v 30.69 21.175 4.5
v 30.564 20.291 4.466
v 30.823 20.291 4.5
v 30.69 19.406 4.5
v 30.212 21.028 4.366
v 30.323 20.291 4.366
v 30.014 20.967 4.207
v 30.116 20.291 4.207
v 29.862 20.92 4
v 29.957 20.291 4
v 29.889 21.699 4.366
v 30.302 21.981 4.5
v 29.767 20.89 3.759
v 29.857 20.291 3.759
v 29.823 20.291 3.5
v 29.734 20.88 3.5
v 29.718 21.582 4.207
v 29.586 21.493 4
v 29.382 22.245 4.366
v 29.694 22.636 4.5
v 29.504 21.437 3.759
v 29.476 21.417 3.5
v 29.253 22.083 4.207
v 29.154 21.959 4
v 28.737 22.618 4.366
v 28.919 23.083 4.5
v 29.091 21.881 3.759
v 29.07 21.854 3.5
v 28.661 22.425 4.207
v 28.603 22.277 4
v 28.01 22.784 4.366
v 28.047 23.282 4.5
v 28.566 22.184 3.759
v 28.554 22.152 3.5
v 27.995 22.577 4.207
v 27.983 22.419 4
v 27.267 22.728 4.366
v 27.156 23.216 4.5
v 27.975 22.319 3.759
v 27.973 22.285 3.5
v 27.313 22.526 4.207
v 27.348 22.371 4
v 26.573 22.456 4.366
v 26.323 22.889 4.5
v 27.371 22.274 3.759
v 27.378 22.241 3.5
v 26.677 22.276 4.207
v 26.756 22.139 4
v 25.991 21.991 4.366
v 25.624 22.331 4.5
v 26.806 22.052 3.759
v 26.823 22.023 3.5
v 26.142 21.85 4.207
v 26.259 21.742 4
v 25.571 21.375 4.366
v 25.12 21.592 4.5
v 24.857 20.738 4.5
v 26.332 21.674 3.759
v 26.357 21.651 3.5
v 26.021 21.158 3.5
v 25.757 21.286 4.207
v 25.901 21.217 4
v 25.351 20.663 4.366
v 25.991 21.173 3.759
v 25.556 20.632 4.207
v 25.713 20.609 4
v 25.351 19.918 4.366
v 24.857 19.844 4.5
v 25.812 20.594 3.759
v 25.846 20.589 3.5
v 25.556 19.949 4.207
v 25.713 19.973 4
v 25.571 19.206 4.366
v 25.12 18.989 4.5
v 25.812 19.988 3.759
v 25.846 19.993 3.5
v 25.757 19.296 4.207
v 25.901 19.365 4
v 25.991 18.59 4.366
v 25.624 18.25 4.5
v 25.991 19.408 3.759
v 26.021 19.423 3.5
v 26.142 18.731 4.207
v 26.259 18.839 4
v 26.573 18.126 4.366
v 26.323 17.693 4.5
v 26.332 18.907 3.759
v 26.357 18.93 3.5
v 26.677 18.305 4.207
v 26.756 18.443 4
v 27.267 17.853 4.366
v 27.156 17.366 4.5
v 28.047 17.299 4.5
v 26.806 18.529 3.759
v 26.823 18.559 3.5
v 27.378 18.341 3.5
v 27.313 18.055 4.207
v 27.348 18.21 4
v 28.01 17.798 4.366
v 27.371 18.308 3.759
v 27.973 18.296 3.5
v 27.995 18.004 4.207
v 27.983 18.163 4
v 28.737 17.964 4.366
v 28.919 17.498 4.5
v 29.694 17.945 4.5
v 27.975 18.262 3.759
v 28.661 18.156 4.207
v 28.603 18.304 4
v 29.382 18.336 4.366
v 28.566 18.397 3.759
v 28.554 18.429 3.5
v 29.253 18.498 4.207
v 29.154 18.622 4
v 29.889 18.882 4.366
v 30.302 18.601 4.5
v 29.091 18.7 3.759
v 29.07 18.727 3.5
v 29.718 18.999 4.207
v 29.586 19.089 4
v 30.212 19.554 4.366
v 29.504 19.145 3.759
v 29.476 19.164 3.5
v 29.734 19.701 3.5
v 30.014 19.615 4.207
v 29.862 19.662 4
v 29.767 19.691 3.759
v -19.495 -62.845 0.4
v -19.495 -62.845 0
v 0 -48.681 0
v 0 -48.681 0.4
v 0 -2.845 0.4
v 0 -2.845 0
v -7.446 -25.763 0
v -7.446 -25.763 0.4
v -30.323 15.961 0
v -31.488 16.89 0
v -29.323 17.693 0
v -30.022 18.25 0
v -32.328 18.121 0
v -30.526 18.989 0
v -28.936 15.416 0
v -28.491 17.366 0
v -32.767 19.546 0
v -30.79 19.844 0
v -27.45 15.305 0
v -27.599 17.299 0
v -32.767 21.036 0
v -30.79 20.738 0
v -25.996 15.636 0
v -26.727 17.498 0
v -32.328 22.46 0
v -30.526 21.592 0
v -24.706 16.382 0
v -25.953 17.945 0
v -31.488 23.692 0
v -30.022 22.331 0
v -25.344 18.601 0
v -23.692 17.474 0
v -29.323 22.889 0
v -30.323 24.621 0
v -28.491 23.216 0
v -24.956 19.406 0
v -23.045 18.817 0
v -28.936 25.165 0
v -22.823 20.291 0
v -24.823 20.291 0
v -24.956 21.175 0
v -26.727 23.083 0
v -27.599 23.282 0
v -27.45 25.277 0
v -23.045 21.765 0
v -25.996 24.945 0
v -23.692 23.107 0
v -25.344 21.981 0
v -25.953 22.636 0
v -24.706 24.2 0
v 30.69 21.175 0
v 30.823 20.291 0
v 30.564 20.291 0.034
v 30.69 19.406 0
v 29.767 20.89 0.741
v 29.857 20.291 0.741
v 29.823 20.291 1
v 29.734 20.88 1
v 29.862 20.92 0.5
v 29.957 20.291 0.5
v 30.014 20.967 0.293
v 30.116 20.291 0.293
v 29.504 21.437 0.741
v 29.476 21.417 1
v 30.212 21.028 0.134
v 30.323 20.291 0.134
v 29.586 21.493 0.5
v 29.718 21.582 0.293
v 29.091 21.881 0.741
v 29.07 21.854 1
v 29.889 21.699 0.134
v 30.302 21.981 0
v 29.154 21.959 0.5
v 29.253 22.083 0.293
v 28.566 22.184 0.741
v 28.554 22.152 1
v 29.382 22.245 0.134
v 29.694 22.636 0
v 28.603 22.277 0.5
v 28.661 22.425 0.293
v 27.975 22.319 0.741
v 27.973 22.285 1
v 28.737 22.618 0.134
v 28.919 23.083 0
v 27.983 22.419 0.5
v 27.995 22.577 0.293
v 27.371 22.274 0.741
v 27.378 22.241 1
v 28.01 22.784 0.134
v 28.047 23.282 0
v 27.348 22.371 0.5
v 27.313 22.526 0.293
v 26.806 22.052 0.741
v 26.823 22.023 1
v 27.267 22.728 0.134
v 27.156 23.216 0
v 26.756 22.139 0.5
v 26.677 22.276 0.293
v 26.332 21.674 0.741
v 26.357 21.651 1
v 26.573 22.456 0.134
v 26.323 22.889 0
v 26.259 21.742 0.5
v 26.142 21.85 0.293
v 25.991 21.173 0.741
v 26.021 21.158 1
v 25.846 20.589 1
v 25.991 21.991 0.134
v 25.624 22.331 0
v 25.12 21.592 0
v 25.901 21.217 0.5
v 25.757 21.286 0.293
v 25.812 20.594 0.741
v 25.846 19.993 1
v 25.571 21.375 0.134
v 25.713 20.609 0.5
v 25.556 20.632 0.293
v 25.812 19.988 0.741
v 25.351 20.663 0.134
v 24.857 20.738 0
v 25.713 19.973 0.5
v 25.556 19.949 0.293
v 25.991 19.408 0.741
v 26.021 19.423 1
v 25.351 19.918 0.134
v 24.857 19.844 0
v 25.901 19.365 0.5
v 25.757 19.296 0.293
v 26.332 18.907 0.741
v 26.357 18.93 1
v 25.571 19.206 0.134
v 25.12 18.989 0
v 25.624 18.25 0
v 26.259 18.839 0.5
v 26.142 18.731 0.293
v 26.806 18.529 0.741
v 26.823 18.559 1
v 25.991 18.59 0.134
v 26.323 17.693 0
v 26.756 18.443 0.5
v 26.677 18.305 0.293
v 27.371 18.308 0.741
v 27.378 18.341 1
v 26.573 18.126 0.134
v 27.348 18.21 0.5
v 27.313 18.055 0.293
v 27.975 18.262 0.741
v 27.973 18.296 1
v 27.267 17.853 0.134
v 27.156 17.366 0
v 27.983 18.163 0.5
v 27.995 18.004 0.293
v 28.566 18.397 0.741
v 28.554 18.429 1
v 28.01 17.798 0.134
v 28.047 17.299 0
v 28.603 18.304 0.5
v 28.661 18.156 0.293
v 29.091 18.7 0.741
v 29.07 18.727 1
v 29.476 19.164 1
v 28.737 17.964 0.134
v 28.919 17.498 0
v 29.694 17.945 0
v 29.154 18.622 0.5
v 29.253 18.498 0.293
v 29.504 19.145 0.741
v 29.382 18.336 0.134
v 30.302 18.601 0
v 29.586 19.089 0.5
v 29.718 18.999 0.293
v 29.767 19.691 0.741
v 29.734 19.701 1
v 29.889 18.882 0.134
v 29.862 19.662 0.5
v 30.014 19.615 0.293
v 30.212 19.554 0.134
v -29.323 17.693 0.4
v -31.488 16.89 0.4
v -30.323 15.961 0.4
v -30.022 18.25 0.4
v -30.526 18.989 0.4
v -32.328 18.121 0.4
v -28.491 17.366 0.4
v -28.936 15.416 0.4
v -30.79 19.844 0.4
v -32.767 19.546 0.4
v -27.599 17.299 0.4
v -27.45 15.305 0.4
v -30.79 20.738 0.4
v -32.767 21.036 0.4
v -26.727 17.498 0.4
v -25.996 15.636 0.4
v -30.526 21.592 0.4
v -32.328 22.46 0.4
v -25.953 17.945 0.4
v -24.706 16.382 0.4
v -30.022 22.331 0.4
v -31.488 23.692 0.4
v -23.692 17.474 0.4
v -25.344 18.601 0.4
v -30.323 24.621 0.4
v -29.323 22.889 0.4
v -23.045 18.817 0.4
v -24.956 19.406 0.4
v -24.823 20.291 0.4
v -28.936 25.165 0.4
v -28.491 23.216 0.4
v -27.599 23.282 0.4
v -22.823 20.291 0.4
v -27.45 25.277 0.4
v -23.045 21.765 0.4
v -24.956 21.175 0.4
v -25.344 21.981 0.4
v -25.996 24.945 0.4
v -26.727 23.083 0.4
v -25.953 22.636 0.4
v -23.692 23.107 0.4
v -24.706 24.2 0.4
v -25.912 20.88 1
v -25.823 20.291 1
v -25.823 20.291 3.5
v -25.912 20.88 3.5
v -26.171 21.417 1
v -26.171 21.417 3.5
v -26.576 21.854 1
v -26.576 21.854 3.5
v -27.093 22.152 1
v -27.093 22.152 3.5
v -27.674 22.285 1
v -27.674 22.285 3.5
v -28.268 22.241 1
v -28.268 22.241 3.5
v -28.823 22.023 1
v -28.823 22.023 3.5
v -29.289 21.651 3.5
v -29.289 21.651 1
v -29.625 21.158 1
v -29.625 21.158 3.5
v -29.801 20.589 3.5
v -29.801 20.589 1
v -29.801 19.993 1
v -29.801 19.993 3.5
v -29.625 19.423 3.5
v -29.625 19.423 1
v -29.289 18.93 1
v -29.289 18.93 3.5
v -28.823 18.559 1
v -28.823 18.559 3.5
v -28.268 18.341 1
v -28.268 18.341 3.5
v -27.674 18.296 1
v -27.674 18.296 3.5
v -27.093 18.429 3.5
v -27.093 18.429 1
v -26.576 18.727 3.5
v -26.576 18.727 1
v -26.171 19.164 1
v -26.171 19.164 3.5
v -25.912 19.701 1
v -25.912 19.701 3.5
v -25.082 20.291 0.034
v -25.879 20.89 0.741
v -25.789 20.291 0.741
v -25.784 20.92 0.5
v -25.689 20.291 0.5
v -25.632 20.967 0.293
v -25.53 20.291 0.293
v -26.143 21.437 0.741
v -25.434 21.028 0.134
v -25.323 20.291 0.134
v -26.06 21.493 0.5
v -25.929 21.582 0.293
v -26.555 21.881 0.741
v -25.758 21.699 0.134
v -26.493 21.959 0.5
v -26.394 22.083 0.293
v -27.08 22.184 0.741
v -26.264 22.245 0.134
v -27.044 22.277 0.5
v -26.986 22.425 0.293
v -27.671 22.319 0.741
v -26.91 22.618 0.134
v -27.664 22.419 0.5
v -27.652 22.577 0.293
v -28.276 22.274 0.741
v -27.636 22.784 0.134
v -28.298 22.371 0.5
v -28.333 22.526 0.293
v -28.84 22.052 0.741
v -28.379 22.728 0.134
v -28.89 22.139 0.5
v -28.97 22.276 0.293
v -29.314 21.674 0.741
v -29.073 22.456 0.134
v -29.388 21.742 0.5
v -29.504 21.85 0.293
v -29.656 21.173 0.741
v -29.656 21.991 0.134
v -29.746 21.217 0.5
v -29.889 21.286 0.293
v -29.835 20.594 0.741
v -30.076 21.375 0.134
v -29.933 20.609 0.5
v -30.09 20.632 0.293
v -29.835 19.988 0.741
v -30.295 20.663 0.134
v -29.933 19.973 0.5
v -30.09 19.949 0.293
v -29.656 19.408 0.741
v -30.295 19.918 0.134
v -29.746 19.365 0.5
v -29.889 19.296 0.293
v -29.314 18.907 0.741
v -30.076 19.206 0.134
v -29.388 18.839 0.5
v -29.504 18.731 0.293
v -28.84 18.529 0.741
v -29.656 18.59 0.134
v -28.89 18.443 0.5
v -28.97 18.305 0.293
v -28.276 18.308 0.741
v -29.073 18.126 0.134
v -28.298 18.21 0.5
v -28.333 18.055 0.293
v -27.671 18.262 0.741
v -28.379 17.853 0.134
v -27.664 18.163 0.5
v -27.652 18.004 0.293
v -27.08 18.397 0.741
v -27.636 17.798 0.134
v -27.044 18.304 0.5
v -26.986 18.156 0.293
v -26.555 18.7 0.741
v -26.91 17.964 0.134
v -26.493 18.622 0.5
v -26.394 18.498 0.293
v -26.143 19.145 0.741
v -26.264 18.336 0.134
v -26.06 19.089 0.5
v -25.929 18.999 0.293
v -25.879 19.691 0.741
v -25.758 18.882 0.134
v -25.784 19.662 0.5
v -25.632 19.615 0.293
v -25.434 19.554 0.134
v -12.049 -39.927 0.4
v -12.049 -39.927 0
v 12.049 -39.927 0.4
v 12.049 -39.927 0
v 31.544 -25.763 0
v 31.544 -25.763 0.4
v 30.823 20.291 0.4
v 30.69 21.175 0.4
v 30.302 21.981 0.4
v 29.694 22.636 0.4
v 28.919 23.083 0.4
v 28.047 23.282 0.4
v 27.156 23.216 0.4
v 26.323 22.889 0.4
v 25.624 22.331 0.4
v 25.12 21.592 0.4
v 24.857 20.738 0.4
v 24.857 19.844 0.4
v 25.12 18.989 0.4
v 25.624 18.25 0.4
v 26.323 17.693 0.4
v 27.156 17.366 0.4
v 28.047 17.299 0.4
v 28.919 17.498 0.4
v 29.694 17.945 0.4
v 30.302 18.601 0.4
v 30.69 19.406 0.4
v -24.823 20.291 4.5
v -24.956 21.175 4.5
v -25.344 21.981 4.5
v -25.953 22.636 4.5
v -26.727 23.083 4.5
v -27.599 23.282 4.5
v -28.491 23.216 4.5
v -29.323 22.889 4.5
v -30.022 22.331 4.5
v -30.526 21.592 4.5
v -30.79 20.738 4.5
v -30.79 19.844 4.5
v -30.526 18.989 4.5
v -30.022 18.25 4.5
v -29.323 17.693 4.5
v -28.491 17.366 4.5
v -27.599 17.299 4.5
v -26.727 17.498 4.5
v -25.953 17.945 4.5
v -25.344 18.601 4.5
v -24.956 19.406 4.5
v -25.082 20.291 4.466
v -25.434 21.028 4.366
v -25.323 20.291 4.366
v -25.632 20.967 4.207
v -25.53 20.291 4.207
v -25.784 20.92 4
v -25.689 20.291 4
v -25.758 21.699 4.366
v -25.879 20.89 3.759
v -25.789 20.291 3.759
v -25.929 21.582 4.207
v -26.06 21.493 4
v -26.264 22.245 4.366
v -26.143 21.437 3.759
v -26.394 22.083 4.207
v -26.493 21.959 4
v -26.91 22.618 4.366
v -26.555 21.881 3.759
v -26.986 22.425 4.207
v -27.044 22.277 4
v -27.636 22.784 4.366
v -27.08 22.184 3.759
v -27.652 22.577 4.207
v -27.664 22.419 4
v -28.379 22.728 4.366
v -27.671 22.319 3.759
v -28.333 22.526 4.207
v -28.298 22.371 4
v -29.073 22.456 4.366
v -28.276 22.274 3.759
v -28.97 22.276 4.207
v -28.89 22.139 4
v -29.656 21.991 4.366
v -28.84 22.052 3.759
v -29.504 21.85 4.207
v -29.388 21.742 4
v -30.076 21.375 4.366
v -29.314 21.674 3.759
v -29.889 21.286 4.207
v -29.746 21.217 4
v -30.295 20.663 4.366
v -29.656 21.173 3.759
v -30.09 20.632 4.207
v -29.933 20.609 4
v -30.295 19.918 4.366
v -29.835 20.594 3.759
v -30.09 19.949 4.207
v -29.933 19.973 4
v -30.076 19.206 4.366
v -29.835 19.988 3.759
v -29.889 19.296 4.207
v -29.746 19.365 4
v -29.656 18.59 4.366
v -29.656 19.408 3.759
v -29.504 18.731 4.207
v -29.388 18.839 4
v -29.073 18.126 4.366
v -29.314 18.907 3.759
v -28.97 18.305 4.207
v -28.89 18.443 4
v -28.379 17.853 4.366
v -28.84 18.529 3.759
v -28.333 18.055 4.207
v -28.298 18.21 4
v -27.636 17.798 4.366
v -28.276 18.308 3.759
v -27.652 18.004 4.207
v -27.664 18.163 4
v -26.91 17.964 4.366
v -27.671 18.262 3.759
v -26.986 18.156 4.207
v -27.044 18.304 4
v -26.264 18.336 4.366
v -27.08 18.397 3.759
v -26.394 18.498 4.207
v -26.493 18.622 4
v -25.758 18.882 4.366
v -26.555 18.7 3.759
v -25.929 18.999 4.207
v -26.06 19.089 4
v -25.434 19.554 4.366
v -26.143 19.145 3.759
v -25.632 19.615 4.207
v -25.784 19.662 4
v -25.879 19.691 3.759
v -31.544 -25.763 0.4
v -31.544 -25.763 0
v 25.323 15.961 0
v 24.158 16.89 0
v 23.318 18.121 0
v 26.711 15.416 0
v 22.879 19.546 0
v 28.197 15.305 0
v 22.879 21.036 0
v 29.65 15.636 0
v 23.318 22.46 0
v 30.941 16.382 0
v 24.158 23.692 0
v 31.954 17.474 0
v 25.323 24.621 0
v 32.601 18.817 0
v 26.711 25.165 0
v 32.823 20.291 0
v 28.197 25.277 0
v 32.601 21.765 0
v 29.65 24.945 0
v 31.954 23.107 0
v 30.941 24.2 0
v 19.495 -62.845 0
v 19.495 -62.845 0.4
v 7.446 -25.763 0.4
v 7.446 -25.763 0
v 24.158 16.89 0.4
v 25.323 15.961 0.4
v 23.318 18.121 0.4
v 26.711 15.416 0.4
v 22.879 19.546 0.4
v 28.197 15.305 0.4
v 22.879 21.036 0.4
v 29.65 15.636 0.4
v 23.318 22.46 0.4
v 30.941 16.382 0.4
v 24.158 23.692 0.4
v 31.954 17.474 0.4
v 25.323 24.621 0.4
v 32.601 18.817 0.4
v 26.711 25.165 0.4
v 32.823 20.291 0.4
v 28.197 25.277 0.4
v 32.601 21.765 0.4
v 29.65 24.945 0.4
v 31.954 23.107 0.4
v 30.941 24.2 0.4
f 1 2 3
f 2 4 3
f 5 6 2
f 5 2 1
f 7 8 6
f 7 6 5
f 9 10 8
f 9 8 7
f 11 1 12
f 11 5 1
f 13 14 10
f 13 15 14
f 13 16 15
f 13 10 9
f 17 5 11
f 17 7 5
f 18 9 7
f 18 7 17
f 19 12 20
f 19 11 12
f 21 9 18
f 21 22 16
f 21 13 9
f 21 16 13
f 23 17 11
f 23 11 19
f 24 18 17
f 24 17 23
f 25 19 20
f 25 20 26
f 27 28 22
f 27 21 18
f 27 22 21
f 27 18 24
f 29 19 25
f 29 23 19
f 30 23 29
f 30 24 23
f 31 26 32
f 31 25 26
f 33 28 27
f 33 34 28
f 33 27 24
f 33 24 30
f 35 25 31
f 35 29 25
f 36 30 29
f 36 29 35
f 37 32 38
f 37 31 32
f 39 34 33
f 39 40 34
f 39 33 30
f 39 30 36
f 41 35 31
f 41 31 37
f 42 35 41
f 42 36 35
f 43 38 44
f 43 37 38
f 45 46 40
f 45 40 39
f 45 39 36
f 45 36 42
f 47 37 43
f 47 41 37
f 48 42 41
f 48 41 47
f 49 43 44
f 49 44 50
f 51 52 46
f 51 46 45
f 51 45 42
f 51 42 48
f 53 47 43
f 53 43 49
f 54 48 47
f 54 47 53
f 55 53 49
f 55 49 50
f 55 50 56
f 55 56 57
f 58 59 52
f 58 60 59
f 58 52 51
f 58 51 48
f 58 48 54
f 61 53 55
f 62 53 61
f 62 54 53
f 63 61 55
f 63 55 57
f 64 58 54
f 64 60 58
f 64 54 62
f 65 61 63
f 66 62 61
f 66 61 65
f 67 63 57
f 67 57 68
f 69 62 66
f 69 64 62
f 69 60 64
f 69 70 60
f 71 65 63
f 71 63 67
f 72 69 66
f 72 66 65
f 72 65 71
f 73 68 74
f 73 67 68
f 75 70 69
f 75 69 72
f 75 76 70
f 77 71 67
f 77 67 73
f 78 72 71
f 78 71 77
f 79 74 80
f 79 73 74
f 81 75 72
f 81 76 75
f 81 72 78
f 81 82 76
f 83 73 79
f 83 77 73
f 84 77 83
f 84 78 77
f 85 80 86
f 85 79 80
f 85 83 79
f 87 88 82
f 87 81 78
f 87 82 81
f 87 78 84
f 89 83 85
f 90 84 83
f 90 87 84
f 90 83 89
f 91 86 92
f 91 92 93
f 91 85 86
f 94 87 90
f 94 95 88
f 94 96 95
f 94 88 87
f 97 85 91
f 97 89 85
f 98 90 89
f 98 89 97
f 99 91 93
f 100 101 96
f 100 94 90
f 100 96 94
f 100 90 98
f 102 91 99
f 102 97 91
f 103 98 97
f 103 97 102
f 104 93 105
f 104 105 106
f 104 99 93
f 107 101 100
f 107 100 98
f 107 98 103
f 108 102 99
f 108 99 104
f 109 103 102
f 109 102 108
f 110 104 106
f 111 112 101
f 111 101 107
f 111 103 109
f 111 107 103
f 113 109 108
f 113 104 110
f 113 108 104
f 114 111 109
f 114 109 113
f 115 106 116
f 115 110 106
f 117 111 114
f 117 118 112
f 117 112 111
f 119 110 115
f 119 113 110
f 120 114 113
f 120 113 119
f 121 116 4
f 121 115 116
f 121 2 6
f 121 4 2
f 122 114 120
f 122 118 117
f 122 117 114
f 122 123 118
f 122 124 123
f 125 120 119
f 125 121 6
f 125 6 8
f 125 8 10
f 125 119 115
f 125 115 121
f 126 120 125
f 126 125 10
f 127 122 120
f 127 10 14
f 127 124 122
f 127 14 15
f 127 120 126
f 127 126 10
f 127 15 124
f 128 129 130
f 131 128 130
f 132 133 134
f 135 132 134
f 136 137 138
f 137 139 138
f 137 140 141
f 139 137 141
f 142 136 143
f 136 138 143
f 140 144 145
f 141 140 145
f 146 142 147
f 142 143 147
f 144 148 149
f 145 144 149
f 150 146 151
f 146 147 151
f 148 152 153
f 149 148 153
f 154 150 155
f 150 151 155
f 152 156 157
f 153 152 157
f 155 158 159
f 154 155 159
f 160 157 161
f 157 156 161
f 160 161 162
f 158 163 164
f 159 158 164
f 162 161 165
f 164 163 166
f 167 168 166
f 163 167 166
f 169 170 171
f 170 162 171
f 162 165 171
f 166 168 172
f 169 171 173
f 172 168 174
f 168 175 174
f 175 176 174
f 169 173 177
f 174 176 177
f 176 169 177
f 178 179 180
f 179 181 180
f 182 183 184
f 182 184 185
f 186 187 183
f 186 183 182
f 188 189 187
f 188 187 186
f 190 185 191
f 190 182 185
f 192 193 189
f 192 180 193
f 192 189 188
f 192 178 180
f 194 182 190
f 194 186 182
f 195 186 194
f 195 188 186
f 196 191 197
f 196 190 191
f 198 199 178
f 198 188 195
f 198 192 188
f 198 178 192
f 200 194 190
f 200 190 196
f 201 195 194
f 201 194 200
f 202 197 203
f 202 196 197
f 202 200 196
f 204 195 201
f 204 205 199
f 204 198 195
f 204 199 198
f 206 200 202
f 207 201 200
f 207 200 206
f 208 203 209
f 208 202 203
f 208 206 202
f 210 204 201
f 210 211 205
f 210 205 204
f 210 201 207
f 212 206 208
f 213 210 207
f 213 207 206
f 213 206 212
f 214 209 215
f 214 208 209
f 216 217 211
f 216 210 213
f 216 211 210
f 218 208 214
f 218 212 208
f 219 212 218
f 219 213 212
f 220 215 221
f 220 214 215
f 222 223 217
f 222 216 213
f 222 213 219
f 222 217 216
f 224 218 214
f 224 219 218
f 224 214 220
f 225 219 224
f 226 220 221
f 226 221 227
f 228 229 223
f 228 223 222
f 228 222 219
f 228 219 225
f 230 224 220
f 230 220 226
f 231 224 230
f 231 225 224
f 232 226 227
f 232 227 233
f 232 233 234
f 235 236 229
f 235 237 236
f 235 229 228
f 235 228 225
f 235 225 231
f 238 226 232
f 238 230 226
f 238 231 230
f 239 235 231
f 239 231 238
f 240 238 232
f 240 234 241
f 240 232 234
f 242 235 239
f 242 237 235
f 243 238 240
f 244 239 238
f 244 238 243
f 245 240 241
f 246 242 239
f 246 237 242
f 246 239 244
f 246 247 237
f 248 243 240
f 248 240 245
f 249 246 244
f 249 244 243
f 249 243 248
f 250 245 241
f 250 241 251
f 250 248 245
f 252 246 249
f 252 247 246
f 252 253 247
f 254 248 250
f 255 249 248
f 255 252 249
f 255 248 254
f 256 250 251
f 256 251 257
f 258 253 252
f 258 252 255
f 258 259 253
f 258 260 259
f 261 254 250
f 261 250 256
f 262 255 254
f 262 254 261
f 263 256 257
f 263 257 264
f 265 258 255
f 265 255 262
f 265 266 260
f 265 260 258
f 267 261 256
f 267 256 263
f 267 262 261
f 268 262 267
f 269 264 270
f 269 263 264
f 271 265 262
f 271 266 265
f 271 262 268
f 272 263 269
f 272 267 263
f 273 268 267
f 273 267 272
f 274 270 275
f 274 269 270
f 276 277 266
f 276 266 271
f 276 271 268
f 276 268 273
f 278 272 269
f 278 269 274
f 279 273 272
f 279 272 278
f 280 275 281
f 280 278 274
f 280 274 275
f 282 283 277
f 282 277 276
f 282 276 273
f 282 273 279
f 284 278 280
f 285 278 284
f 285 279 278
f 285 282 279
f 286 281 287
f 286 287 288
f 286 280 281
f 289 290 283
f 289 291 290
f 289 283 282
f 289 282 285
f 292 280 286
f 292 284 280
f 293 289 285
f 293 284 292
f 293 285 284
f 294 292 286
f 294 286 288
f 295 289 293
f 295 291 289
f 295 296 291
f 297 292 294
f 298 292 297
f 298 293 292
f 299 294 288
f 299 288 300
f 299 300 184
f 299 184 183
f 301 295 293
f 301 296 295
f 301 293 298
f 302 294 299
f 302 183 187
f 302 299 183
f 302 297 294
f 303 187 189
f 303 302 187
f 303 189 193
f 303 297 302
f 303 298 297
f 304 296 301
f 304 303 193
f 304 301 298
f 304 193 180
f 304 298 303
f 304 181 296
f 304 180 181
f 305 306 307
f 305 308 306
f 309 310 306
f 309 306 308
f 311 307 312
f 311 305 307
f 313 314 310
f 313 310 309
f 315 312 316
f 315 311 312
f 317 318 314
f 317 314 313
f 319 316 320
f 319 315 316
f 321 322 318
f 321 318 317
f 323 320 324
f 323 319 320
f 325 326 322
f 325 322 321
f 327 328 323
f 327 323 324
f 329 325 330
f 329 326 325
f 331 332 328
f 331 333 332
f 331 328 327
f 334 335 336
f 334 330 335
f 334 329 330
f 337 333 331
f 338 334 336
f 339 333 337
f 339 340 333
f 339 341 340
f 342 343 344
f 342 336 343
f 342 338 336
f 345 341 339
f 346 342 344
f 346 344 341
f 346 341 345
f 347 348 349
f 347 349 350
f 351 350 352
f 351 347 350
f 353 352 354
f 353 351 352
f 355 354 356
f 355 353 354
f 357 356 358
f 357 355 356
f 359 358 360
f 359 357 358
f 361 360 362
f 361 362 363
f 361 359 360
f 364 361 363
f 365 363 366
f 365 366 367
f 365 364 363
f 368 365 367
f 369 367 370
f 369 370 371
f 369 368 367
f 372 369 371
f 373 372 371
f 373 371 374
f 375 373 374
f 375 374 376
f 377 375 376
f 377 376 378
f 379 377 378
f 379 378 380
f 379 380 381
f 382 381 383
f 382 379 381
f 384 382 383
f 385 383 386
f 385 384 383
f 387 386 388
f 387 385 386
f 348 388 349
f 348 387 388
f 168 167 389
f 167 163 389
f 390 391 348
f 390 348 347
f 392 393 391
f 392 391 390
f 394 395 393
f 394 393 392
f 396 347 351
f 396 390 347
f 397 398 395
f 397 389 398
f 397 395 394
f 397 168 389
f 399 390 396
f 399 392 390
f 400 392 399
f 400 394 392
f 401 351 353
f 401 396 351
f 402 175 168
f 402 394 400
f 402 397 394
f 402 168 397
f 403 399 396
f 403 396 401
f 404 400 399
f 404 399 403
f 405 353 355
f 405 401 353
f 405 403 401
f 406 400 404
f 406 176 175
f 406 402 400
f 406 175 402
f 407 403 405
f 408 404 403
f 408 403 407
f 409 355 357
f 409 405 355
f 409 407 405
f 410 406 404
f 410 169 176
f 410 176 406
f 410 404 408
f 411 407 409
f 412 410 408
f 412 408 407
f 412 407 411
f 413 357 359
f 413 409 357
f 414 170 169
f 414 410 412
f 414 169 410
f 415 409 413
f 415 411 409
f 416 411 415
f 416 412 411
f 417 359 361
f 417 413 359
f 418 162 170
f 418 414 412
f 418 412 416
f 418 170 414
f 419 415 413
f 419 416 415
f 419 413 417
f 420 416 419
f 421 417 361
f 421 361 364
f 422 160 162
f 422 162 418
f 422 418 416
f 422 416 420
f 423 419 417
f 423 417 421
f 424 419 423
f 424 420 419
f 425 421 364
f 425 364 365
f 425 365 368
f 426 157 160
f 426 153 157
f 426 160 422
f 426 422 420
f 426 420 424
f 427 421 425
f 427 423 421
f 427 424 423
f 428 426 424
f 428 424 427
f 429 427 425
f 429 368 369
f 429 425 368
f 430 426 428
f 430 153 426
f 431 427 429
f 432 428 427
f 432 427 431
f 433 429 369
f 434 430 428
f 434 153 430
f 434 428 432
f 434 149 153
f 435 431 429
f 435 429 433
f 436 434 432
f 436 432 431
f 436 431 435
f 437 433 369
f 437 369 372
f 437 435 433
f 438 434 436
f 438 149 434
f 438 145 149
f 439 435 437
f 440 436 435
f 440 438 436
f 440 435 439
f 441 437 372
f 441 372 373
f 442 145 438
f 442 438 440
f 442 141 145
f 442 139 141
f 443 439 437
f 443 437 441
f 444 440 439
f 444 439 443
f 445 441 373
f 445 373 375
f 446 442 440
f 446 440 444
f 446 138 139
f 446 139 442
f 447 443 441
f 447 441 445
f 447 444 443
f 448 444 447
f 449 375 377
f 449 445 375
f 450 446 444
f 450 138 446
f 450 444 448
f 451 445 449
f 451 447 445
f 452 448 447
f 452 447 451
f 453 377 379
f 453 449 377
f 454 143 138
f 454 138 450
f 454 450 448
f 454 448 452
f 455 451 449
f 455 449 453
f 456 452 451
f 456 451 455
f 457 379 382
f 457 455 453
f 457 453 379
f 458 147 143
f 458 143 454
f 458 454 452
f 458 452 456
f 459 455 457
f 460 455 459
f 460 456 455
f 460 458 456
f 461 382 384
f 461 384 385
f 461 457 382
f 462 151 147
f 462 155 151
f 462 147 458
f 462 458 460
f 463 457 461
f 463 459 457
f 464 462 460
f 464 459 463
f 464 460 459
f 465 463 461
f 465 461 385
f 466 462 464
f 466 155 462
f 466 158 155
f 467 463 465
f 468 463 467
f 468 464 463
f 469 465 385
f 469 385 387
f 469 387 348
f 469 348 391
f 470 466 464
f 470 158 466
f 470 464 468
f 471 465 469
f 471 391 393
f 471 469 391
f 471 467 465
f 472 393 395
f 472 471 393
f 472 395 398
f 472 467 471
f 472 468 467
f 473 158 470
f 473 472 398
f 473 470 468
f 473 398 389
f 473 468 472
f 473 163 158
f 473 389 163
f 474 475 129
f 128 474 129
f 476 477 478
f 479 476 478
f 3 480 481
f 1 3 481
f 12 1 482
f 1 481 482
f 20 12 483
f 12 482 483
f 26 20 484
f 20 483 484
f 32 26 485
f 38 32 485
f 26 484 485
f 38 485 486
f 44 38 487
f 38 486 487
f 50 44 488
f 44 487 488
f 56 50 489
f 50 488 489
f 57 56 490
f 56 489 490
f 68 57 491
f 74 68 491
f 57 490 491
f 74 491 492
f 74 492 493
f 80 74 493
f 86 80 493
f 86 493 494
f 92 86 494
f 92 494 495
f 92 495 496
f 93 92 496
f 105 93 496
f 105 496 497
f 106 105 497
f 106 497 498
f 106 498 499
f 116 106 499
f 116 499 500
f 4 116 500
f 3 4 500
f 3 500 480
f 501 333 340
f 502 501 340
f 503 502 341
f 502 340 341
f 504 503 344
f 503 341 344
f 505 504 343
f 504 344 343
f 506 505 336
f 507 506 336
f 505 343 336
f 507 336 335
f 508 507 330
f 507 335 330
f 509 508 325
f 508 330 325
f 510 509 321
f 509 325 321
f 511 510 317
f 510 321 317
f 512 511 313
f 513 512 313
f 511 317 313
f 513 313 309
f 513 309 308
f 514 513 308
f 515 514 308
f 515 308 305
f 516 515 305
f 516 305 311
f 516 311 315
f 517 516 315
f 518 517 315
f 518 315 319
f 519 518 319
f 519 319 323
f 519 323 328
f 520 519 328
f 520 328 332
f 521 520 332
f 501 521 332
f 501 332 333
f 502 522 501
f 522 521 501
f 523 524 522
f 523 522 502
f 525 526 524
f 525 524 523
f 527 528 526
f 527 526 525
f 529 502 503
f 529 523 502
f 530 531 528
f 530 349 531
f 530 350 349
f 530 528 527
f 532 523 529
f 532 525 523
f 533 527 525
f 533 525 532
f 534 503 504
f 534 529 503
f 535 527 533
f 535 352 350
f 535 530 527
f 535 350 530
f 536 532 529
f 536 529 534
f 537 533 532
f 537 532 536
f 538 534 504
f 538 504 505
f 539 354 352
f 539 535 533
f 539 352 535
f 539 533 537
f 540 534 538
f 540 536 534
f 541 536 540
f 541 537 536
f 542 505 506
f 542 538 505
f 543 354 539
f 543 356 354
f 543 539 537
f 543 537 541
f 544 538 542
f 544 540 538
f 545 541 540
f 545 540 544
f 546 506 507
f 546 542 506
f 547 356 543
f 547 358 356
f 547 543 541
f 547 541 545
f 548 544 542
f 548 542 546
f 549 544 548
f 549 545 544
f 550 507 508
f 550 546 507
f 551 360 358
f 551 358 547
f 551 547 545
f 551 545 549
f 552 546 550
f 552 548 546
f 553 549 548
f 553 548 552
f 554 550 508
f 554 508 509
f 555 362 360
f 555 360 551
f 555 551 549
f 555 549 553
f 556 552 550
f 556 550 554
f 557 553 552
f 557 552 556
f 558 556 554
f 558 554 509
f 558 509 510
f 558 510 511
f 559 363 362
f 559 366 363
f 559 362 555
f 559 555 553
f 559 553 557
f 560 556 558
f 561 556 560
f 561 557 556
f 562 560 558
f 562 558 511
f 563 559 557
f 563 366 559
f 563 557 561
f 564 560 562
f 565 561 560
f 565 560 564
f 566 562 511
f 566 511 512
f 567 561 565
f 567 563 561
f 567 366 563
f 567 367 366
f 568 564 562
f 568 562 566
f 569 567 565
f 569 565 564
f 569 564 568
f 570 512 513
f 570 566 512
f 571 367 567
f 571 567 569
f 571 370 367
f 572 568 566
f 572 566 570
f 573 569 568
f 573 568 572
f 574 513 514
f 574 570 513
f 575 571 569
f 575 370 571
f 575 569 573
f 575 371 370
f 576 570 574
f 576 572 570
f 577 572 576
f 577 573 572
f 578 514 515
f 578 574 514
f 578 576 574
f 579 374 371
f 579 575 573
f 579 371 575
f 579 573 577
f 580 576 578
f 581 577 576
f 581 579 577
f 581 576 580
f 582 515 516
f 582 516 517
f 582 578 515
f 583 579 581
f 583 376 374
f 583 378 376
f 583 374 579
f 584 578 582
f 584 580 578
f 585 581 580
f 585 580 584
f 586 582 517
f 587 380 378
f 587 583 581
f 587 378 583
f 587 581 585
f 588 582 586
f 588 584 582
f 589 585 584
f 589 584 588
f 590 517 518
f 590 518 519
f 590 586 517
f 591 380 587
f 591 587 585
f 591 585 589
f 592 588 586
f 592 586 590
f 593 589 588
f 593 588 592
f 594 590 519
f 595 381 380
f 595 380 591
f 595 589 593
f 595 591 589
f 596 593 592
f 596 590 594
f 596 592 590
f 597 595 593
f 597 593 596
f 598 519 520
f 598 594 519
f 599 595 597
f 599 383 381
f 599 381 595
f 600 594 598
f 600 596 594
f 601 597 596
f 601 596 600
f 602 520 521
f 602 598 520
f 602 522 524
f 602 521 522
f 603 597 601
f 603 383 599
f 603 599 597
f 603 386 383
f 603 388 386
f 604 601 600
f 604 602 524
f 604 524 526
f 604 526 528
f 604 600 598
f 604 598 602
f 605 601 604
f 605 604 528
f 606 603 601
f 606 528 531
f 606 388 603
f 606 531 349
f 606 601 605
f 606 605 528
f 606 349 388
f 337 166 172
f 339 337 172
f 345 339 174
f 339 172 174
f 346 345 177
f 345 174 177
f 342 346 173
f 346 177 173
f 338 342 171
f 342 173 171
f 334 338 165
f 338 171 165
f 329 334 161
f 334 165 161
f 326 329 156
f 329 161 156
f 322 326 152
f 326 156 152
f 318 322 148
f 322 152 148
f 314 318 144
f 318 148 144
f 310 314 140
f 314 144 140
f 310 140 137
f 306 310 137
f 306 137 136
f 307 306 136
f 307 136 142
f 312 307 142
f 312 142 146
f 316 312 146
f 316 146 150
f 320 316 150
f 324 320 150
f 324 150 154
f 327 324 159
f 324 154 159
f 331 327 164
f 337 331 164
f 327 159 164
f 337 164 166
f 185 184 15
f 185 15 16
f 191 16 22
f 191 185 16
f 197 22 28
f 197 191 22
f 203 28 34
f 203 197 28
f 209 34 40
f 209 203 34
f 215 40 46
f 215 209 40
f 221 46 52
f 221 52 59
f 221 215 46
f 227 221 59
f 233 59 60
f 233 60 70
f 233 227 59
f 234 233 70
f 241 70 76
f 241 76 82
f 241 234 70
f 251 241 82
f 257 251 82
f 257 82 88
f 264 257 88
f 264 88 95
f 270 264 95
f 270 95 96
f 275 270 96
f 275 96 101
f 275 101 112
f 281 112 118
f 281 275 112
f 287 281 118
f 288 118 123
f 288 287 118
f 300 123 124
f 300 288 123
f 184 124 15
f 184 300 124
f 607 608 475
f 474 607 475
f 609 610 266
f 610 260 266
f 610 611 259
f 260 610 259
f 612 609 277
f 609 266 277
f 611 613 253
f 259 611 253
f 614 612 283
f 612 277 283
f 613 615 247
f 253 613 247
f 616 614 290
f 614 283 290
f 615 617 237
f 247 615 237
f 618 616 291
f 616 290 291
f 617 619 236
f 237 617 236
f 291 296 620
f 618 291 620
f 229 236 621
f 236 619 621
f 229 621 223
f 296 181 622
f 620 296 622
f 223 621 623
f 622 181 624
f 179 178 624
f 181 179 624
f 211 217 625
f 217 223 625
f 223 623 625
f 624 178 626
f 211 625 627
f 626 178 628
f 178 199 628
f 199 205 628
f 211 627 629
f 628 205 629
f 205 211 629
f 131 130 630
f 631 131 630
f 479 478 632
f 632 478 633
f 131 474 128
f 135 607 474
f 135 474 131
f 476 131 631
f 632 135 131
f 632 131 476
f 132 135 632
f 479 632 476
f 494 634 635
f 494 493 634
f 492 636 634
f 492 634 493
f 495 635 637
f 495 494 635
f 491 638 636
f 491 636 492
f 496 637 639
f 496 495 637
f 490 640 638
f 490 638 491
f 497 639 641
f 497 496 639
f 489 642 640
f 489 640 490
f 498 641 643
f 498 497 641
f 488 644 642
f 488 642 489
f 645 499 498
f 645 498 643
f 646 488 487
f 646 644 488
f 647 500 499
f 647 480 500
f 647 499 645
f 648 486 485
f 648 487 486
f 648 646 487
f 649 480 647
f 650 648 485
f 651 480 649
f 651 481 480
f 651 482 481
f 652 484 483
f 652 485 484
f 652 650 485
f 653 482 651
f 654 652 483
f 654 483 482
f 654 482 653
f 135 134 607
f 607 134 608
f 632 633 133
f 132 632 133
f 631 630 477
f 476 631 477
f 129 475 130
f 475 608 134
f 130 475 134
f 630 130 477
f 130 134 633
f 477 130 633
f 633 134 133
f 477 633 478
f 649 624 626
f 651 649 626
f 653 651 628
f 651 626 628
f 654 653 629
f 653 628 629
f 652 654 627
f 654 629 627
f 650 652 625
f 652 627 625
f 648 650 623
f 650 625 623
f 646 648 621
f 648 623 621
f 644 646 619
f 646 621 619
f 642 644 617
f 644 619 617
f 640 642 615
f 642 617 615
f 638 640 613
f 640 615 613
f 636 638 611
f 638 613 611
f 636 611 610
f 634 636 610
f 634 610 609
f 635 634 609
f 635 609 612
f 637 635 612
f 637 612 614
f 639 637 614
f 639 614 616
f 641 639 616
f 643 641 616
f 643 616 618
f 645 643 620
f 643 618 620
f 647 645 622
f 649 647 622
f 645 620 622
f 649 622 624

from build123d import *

# Parameters (mm, degrees)
F0_R     = 5
F0_R_2   = 3
F1_DEPTH = 0.4
F0_R_3   = 2
F2_DEPTH = 4.5
F3_R     = 0.99999
F3_2_R   = 0.99999
F5_DEPTH = 0.4


# Not quite as in the source:
# - a fillet or chamfer is up to 0.001 mm smaller than in the source, because OpenCascade refuses the exact size


with BuildPart() as f1:
    # F0 (on Top) → F1 (new body)
    with BuildSketch(Plane.XY):
        with Locations((-27.8231911361, 20.2907286584)):
            Circle(F0_R)
        with Locations((-27.8231911361, 20.2907286584)):
            Circle(F0_R_2, mode=Mode.SUBTRACT)
    extrude(amount=F1_DEPTH)

    # F0 (on Top) → F2 (join)
    with BuildSketch(Plane.XY):
        with Locations((-27.8231911361, 20.2907286584)):
            Circle(F0_R_2)
        with Locations((-27.8231911361, 20.2907286584)):
            Circle(F0_R_3, mode=Mode.SUBTRACT)
    extrude(amount=F2_DEPTH)

    # F3 (radius 1 in the source; OpenCascade refuses exactly that, so slightly less here)
    f3_edges = [f1.edges().sort_by_distance(p)[0] for p in [
        (-29.823191, 20.290729, 4.5),
        (-29.823191, 20.290729, 0),
    ]]
    fillet(f3_edges, radius=F3_R)


with BuildPart() as f1b:
    # F0 (on Top) → F1, piece 2 (new body)
    with BuildSketch(Plane.XY):
        with Locations((27.8231911361, 20.2907286584)):
            Circle(F0_R)
        with Locations((27.8231911361, 20.2907286584)):
            Circle(F0_R_2, mode=Mode.SUBTRACT)
    extrude(amount=F1_DEPTH)

    # F0 (on Top) → F2, piece 2 (join)
    with BuildSketch(Plane.XY):
        with Locations((27.8231911361, 20.2907286584)):
            Circle(F0_R_2)
        with Locations((27.8231911361, 20.2907286584)):
            Circle(F0_R_3, mode=Mode.SUBTRACT)
    extrude(amount=F2_DEPTH)

    # F3#2 (radius 1 in the source; OpenCascade refuses exactly that, so slightly less here)
    f3_2_edges = [f1b.edges().sort_by_distance(p)[0] for p in [
        (25.823191, 20.290729, 4.5),
        (25.823191, 20.290729, 0),
    ]]
    fillet(f3_2_edges, radius=F3_2_R)


with BuildPart() as f5:
    # F4 (on Top) → F5 (new body)
    with BuildSketch(Plane.XY):
        Polygon((-31.5438667271, -25.7632551613), (-12.0486849532, -39.9273338113), (-19.495181774, -62.8452944863), (0, -48.6812158363), (19.495181774, -62.8452944863), (12.0486849532, -39.9273338113), (31.5438667271, -25.7632551613), (7.4464968208, -25.7632551613), (0, -2.8452944863), (-7.4464968208, -25.7632551613), align=None)
    extrude(amount=F5_DEPTH)


solid = Compound([f1.part, f1b.part, f5.part])
